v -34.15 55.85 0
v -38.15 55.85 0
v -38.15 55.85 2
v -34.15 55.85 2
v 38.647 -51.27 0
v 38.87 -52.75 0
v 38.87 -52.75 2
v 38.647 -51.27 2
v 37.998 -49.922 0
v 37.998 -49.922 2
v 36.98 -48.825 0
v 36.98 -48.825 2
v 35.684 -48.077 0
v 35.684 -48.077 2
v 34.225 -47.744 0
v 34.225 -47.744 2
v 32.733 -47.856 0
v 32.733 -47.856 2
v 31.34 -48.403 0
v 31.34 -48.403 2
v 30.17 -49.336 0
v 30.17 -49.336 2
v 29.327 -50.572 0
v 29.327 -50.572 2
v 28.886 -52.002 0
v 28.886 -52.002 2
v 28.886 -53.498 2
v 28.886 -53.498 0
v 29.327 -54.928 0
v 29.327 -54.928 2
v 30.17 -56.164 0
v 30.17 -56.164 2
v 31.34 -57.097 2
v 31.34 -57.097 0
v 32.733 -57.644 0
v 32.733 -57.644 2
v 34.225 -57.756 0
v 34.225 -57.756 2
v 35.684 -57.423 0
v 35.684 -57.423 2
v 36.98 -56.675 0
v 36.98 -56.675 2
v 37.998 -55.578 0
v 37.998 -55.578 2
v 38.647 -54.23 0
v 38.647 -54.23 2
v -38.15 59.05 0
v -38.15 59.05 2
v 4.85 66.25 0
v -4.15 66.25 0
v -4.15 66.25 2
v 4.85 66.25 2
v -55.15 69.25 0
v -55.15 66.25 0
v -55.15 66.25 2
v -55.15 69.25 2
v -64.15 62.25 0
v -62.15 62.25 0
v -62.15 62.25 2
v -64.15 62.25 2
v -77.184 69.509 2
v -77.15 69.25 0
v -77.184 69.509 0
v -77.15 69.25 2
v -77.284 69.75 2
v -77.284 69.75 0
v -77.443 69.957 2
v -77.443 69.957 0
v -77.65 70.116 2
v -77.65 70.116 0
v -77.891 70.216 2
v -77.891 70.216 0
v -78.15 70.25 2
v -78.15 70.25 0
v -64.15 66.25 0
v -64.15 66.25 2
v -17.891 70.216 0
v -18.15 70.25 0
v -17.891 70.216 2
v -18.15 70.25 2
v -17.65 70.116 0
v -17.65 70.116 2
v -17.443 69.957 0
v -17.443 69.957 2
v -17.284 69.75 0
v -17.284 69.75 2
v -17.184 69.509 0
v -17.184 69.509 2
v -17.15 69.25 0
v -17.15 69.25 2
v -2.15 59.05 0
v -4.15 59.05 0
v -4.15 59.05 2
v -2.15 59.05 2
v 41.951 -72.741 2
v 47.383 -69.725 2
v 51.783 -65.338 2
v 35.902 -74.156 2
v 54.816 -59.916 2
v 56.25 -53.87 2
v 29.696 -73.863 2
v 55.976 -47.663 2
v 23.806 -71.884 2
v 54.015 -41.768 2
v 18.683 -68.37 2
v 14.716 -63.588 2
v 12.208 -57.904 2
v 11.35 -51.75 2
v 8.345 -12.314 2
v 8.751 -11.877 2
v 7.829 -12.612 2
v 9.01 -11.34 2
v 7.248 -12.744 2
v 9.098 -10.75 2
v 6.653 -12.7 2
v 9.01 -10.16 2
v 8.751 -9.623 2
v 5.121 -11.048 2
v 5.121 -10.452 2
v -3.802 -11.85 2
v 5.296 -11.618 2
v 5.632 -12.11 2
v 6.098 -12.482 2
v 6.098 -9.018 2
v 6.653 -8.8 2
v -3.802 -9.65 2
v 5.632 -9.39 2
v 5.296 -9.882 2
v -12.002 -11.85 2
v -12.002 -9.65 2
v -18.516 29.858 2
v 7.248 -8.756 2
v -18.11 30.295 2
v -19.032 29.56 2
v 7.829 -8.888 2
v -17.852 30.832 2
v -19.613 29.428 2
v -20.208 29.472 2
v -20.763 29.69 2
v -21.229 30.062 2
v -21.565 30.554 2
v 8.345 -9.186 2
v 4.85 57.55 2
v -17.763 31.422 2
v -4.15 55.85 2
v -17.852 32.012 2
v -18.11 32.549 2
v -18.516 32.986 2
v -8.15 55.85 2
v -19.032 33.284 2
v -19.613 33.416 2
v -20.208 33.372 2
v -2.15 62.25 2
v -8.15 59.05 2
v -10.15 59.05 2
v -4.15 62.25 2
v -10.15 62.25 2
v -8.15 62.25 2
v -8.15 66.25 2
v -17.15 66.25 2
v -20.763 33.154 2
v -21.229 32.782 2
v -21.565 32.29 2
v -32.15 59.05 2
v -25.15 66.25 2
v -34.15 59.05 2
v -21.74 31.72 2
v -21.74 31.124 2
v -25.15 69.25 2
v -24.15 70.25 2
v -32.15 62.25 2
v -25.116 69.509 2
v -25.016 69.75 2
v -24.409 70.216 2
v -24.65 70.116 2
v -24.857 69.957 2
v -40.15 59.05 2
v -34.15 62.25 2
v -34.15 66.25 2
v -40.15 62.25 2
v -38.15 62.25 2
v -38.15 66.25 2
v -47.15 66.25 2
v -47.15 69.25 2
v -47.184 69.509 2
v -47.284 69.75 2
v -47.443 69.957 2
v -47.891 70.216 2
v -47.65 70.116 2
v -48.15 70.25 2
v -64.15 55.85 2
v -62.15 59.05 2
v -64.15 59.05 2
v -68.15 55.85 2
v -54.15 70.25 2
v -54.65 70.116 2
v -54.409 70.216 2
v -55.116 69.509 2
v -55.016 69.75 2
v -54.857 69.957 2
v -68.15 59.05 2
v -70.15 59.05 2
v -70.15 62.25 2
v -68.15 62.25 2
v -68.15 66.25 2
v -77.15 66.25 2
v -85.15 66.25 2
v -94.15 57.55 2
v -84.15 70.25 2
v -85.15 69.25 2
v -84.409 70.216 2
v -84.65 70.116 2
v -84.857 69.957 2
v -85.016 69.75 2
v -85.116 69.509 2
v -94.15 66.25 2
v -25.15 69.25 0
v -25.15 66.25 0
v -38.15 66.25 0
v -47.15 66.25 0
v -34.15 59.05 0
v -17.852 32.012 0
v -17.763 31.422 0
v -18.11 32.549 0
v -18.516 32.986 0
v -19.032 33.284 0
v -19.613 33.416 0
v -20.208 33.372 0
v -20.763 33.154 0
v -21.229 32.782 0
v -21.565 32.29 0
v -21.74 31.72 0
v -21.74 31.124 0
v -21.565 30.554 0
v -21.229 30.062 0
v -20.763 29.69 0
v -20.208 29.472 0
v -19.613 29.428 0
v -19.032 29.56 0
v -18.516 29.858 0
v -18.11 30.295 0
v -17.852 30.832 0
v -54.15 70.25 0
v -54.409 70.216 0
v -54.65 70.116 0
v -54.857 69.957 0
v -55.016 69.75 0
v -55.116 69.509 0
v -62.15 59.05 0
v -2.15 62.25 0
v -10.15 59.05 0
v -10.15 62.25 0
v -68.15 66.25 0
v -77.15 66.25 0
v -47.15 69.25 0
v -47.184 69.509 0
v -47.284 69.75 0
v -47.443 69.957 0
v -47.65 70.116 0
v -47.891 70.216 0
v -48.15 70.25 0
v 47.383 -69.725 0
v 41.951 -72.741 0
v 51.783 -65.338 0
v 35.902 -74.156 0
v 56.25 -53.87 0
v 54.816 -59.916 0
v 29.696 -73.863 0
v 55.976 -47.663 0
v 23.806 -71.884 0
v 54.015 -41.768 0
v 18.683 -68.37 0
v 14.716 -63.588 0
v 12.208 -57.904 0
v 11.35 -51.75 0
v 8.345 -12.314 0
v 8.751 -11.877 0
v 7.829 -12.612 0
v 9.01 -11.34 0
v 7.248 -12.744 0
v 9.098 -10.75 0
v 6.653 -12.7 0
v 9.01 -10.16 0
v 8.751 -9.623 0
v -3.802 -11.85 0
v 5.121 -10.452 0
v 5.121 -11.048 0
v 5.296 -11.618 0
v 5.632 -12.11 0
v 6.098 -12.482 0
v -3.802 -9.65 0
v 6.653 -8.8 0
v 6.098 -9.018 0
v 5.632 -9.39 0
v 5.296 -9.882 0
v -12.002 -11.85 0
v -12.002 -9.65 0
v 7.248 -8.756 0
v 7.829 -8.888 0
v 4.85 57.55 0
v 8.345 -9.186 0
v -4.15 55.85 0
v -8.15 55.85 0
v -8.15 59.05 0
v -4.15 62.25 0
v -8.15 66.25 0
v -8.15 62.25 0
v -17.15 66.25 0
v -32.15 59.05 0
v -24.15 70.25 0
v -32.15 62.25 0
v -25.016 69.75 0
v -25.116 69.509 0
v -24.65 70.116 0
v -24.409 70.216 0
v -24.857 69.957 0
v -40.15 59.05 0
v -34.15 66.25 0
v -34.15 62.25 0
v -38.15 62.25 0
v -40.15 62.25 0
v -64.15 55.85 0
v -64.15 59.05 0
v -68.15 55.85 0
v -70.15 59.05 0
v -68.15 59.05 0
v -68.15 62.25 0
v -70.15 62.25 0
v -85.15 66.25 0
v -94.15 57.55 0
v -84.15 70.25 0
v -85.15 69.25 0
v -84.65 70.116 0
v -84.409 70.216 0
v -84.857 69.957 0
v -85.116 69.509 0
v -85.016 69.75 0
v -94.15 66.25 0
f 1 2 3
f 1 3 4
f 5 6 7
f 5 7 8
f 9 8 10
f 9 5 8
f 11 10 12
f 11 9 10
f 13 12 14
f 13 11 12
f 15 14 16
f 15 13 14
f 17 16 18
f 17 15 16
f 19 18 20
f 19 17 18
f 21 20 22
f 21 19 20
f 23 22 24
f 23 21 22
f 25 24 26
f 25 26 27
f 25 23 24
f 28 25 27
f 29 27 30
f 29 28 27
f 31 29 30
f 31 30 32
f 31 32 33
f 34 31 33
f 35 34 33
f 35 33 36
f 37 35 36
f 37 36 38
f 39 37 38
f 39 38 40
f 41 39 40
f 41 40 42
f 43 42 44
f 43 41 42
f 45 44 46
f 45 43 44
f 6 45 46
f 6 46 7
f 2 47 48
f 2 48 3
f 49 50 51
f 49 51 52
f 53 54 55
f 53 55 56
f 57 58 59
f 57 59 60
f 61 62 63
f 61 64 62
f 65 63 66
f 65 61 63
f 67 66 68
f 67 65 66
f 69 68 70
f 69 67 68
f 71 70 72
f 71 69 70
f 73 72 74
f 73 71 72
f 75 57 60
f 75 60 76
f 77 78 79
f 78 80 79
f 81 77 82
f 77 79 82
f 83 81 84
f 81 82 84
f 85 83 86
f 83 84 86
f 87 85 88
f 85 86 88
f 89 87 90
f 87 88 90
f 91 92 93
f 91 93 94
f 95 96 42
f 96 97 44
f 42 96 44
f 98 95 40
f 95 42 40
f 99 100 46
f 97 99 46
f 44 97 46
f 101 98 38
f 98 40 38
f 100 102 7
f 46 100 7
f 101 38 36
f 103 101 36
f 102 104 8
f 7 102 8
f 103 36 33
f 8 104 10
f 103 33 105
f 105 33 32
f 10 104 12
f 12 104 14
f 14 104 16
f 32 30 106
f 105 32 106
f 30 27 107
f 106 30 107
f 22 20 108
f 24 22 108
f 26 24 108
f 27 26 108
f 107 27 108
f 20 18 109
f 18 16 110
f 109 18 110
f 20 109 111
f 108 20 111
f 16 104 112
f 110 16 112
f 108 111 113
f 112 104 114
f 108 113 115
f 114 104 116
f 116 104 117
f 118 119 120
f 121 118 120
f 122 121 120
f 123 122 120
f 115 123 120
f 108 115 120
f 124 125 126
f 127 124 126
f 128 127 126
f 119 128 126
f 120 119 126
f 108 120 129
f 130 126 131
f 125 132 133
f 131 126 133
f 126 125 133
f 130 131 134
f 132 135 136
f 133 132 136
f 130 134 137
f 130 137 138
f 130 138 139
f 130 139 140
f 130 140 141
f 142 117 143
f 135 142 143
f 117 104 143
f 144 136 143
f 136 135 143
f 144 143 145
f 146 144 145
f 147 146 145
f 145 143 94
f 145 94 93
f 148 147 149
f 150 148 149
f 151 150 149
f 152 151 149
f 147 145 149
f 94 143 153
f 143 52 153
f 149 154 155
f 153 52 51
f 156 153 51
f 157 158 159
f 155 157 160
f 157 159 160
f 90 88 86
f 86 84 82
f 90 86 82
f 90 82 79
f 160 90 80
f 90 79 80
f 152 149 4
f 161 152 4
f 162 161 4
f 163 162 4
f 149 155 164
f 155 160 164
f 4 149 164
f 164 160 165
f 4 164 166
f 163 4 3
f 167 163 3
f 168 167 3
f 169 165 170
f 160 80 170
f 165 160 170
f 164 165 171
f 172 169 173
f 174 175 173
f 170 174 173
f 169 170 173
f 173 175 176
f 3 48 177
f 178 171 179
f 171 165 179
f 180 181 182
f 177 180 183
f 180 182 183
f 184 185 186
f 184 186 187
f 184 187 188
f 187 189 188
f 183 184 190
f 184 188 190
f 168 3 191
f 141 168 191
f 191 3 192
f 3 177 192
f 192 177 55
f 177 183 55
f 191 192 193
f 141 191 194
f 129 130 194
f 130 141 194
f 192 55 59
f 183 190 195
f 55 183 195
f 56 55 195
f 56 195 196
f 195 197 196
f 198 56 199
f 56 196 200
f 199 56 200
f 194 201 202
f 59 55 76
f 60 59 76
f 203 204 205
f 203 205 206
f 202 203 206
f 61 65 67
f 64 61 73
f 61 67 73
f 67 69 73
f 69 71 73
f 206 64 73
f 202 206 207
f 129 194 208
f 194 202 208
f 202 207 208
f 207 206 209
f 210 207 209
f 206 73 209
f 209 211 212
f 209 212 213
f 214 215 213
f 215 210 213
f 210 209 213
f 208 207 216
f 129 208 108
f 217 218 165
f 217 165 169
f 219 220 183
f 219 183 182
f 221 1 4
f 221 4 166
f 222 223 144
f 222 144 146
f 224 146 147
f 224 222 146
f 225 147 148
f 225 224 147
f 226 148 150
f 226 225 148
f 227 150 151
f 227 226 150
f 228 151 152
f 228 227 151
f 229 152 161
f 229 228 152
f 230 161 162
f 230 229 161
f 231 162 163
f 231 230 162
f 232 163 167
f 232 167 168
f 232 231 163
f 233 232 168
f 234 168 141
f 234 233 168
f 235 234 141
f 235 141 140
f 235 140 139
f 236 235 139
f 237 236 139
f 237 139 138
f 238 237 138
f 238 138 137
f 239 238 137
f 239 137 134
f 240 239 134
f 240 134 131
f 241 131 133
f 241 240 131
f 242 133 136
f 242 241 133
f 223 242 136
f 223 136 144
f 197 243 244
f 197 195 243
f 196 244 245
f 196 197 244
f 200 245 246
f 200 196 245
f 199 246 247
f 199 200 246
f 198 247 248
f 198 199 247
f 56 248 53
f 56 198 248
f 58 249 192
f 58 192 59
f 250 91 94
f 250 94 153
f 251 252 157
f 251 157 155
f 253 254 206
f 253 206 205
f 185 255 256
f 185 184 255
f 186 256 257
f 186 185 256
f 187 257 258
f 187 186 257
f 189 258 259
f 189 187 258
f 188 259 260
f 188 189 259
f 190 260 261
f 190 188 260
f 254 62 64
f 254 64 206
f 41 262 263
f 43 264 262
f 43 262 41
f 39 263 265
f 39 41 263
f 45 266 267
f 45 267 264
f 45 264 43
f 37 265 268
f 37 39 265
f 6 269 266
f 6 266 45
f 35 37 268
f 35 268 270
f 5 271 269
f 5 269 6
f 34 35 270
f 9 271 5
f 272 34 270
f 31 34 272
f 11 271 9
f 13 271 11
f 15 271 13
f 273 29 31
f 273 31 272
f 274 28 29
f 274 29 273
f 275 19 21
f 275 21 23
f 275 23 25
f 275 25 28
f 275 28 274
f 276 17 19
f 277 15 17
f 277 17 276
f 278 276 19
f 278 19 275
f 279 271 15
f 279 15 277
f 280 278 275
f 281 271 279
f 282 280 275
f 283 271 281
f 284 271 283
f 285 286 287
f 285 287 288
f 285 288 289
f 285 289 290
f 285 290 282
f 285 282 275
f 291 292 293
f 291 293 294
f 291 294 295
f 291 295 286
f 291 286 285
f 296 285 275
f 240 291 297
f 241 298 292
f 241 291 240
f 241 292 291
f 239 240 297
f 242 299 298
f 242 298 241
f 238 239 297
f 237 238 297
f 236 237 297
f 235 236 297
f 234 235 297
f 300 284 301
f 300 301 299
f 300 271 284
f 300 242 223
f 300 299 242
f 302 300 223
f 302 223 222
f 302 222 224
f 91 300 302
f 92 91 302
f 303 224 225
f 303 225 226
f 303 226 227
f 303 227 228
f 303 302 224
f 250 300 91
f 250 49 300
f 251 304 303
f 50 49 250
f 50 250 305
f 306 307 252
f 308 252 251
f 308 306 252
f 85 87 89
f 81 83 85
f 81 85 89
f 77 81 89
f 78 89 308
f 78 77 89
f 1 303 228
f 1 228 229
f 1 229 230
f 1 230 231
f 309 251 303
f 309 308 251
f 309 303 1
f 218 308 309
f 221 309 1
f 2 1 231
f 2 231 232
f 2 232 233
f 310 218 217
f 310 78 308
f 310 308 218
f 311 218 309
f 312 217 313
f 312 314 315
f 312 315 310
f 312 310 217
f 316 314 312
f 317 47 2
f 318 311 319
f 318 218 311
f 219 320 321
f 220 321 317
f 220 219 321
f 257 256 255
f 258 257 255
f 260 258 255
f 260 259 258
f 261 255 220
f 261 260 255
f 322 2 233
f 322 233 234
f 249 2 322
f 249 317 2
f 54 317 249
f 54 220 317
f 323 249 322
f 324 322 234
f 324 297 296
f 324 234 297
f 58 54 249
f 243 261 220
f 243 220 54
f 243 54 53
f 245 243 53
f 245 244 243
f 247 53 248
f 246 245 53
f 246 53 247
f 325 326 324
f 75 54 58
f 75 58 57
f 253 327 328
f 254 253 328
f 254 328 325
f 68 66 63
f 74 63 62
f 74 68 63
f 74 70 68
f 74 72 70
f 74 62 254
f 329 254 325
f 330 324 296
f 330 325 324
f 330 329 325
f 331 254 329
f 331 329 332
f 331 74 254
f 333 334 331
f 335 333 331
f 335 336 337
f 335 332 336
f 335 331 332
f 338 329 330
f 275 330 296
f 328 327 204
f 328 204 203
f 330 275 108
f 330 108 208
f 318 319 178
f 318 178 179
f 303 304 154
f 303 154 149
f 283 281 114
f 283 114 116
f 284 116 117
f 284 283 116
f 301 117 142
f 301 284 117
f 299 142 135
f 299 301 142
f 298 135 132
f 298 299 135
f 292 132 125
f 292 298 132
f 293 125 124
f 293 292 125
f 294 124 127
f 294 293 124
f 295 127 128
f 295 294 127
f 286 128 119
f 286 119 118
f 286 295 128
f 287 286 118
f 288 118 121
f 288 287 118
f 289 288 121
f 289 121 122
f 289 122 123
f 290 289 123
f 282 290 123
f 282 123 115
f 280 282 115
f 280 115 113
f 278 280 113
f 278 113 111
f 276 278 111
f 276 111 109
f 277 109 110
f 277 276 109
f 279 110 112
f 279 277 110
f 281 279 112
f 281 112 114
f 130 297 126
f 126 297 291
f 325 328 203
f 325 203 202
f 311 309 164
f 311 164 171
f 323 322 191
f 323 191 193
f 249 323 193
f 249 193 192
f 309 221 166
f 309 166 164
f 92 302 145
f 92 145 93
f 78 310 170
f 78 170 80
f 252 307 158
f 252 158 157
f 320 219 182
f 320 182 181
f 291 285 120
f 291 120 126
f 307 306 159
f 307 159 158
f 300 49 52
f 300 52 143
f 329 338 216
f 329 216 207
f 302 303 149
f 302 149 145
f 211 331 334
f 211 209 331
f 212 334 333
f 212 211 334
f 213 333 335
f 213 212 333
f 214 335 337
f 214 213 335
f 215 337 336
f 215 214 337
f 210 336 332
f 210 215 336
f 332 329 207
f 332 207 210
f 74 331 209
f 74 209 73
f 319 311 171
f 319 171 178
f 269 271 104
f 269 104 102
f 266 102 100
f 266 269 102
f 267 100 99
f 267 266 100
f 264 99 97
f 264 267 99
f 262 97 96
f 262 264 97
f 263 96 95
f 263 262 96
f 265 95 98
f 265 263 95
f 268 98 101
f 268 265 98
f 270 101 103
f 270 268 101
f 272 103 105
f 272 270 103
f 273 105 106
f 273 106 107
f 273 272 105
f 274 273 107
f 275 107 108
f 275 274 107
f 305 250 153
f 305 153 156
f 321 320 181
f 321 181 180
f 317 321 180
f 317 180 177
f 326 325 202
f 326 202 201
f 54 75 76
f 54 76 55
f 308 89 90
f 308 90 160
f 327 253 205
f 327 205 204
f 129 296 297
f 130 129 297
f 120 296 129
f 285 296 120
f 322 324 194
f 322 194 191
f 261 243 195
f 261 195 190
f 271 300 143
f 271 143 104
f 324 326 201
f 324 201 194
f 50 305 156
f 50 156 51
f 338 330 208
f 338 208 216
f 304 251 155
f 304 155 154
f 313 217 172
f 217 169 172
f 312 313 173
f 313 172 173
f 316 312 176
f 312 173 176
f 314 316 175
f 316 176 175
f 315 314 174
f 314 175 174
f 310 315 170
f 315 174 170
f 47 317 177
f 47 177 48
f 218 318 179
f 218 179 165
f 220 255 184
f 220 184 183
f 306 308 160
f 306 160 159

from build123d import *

# Parameters (mm, degrees)
SKETCH_1_R      = 2
SKETCH_1_R_2    = 5.02
SKETCH_1_W      = 8.2
SKETCH_1_H      = 2.2
EXTRUDE_1_DEPTH = 2
FILLET_1_R      = 1


with BuildPart() as part:
    # 草图1 → 凸台-拉伸1 (new body)
    with BuildSketch(Plane.XY):
        with BuildLine():
            Line((-38.15, 66.25), (-38.15, 62.25))
            Line((-38.15, 62.25), (-40.15, 62.25))
            Line((-40.15, 62.25), (-40.15, 59.05))
            Line((-40.15, 59.05), (-38.15, 59.05))
            Line((-38.15, 59.05), (-38.15, 55.85))
            Line((-38.15, 55.85), (-34.15, 55.85))
            Line((-34.15, 55.85), (-34.15, 59.05))
            Line((-34.15, 59.05), (-32.15, 59.05))
            Line((-32.15, 59.05), (-32.15, 62.25))
            Line((-32.15, 62.25), (-34.15, 62.25))
            Line((-34.15, 62.25), (-34.15, 66.25))
            Line((-34.15, 66.25), (-25.15, 66.25))
            Line((-25.15, 66.25), (-25.15, 70.25))
            Line((-25.15, 70.25), (-17.15, 70.25))
            Line((-17.15, 70.25), (-17.15, 66.25))
            Line((-17.15, 66.25), (-8.15, 66.25))
            Line((-8.15, 66.25), (-8.15, 62.25))
            Line((-8.15, 62.25), (-10.15, 62.25))
            Line((-10.15, 62.25), (-10.15, 59.05))
            Line((-10.15, 59.05), (-8.15, 59.05))
            Line((-8.15, 59.05), (-8.15, 55.85))
            Line((-8.15, 55.85), (-4.15, 55.85))
            Line((-4.15, 55.85), (-4.15, 59.05))
            Line((-4.15, 59.05), (-2.15, 59.05))
            Line((-2.15, 59.05), (-2.15, 62.25))
            Line((-2.15, 62.25), (-4.15, 62.25))
            Line((-4.15, 62.25), (-4.15, 66.25))
            Line((-4.15, 66.25), (4.85, 66.25))
            Line((4.85, 66.25), (4.85, 57.55))
            Line((4.85, 57.55), (54.01460577, -41.768082641))
            ThreePointArc((54.01460577, -41.768082641), (38.975737517, -73.658373169), (11.35, -51.75))
            Line((11.35, -51.75), (-94.15, 57.55))
            Line((-94.15, 57.55), (-94.15, 66.25))
            Line((-94.15, 66.25), (-85.15, 66.25))
            Line((-85.15, 66.25), (-85.15, 70.25))
            Line((-85.15, 70.25), (-77.15, 70.25))
            Line((-77.15, 70.25), (-77.15, 66.25))
            Line((-77.15, 66.25), (-68.15, 66.25))
            Line((-68.15, 66.25), (-68.15, 62.25))
            Line((-68.15, 62.25), (-70.15, 62.25))
            Line((-70.15, 62.25), (-70.15, 59.05))
            Line((-70.15, 59.05), (-68.15, 59.05))
            Line((-68.15, 59.05), (-68.15, 55.85))
            Line((-68.15, 55.85), (-64.15, 55.85))
            Line((-64.15, 55.85), (-64.15, 59.05))
            Line((-64.15, 59.05), (-62.15, 59.05))
            Line((-62.15, 59.05), (-62.15, 62.25))
            Line((-62.15, 62.25), (-64.15, 62.25))
            Line((-64.15, 62.25), (-64.15, 66.25))
            Line((-64.15, 66.25), (-55.15, 66.25))
            Line((-55.15, 66.25), (-55.15, 70.25))
            Line((-55.15, 70.25), (-47.15, 70.25))
            Line((-47.15, 70.25), (-47.15, 66.25))
            Line((-47.15, 66.25), (-38.15, 66.25))
        make_face()
        with Locations((-19.762745434, 31.422010331)):
            Circle(SKETCH_1_R, mode=Mode.SUBTRACT)
        with Locations((7.098407643, -10.75)):
            Circle(SKETCH_1_R, mode=Mode.SUBTRACT)
        with Locations((33.85, -52.75)):
            Circle(SKETCH_1_R_2, mode=Mode.SUBTRACT)
        with Locations((-7.901592357, -10.75)):
            Rectangle(SKETCH_1_W, SKETCH_1_H, mode=Mode.SUBTRACT)
    extrude(amount=EXTRUDE_1_DEPTH)

    # 圆角1
    fillet_1_edges = [part.edges().sort_by_distance(p)[0] for p in [
        (-25.15, 70.25, 1),
        (-17.15, 70.25, 1),
        (-85.15, 70.25, 1),
        (-77.15, 70.25, 1),
        (-55.15, 70.25, 1),
        (-47.15, 70.25, 1),
    ]]
    fillet(fillet_1_edges, radius=FILLET_1_R)


solid = part.part
